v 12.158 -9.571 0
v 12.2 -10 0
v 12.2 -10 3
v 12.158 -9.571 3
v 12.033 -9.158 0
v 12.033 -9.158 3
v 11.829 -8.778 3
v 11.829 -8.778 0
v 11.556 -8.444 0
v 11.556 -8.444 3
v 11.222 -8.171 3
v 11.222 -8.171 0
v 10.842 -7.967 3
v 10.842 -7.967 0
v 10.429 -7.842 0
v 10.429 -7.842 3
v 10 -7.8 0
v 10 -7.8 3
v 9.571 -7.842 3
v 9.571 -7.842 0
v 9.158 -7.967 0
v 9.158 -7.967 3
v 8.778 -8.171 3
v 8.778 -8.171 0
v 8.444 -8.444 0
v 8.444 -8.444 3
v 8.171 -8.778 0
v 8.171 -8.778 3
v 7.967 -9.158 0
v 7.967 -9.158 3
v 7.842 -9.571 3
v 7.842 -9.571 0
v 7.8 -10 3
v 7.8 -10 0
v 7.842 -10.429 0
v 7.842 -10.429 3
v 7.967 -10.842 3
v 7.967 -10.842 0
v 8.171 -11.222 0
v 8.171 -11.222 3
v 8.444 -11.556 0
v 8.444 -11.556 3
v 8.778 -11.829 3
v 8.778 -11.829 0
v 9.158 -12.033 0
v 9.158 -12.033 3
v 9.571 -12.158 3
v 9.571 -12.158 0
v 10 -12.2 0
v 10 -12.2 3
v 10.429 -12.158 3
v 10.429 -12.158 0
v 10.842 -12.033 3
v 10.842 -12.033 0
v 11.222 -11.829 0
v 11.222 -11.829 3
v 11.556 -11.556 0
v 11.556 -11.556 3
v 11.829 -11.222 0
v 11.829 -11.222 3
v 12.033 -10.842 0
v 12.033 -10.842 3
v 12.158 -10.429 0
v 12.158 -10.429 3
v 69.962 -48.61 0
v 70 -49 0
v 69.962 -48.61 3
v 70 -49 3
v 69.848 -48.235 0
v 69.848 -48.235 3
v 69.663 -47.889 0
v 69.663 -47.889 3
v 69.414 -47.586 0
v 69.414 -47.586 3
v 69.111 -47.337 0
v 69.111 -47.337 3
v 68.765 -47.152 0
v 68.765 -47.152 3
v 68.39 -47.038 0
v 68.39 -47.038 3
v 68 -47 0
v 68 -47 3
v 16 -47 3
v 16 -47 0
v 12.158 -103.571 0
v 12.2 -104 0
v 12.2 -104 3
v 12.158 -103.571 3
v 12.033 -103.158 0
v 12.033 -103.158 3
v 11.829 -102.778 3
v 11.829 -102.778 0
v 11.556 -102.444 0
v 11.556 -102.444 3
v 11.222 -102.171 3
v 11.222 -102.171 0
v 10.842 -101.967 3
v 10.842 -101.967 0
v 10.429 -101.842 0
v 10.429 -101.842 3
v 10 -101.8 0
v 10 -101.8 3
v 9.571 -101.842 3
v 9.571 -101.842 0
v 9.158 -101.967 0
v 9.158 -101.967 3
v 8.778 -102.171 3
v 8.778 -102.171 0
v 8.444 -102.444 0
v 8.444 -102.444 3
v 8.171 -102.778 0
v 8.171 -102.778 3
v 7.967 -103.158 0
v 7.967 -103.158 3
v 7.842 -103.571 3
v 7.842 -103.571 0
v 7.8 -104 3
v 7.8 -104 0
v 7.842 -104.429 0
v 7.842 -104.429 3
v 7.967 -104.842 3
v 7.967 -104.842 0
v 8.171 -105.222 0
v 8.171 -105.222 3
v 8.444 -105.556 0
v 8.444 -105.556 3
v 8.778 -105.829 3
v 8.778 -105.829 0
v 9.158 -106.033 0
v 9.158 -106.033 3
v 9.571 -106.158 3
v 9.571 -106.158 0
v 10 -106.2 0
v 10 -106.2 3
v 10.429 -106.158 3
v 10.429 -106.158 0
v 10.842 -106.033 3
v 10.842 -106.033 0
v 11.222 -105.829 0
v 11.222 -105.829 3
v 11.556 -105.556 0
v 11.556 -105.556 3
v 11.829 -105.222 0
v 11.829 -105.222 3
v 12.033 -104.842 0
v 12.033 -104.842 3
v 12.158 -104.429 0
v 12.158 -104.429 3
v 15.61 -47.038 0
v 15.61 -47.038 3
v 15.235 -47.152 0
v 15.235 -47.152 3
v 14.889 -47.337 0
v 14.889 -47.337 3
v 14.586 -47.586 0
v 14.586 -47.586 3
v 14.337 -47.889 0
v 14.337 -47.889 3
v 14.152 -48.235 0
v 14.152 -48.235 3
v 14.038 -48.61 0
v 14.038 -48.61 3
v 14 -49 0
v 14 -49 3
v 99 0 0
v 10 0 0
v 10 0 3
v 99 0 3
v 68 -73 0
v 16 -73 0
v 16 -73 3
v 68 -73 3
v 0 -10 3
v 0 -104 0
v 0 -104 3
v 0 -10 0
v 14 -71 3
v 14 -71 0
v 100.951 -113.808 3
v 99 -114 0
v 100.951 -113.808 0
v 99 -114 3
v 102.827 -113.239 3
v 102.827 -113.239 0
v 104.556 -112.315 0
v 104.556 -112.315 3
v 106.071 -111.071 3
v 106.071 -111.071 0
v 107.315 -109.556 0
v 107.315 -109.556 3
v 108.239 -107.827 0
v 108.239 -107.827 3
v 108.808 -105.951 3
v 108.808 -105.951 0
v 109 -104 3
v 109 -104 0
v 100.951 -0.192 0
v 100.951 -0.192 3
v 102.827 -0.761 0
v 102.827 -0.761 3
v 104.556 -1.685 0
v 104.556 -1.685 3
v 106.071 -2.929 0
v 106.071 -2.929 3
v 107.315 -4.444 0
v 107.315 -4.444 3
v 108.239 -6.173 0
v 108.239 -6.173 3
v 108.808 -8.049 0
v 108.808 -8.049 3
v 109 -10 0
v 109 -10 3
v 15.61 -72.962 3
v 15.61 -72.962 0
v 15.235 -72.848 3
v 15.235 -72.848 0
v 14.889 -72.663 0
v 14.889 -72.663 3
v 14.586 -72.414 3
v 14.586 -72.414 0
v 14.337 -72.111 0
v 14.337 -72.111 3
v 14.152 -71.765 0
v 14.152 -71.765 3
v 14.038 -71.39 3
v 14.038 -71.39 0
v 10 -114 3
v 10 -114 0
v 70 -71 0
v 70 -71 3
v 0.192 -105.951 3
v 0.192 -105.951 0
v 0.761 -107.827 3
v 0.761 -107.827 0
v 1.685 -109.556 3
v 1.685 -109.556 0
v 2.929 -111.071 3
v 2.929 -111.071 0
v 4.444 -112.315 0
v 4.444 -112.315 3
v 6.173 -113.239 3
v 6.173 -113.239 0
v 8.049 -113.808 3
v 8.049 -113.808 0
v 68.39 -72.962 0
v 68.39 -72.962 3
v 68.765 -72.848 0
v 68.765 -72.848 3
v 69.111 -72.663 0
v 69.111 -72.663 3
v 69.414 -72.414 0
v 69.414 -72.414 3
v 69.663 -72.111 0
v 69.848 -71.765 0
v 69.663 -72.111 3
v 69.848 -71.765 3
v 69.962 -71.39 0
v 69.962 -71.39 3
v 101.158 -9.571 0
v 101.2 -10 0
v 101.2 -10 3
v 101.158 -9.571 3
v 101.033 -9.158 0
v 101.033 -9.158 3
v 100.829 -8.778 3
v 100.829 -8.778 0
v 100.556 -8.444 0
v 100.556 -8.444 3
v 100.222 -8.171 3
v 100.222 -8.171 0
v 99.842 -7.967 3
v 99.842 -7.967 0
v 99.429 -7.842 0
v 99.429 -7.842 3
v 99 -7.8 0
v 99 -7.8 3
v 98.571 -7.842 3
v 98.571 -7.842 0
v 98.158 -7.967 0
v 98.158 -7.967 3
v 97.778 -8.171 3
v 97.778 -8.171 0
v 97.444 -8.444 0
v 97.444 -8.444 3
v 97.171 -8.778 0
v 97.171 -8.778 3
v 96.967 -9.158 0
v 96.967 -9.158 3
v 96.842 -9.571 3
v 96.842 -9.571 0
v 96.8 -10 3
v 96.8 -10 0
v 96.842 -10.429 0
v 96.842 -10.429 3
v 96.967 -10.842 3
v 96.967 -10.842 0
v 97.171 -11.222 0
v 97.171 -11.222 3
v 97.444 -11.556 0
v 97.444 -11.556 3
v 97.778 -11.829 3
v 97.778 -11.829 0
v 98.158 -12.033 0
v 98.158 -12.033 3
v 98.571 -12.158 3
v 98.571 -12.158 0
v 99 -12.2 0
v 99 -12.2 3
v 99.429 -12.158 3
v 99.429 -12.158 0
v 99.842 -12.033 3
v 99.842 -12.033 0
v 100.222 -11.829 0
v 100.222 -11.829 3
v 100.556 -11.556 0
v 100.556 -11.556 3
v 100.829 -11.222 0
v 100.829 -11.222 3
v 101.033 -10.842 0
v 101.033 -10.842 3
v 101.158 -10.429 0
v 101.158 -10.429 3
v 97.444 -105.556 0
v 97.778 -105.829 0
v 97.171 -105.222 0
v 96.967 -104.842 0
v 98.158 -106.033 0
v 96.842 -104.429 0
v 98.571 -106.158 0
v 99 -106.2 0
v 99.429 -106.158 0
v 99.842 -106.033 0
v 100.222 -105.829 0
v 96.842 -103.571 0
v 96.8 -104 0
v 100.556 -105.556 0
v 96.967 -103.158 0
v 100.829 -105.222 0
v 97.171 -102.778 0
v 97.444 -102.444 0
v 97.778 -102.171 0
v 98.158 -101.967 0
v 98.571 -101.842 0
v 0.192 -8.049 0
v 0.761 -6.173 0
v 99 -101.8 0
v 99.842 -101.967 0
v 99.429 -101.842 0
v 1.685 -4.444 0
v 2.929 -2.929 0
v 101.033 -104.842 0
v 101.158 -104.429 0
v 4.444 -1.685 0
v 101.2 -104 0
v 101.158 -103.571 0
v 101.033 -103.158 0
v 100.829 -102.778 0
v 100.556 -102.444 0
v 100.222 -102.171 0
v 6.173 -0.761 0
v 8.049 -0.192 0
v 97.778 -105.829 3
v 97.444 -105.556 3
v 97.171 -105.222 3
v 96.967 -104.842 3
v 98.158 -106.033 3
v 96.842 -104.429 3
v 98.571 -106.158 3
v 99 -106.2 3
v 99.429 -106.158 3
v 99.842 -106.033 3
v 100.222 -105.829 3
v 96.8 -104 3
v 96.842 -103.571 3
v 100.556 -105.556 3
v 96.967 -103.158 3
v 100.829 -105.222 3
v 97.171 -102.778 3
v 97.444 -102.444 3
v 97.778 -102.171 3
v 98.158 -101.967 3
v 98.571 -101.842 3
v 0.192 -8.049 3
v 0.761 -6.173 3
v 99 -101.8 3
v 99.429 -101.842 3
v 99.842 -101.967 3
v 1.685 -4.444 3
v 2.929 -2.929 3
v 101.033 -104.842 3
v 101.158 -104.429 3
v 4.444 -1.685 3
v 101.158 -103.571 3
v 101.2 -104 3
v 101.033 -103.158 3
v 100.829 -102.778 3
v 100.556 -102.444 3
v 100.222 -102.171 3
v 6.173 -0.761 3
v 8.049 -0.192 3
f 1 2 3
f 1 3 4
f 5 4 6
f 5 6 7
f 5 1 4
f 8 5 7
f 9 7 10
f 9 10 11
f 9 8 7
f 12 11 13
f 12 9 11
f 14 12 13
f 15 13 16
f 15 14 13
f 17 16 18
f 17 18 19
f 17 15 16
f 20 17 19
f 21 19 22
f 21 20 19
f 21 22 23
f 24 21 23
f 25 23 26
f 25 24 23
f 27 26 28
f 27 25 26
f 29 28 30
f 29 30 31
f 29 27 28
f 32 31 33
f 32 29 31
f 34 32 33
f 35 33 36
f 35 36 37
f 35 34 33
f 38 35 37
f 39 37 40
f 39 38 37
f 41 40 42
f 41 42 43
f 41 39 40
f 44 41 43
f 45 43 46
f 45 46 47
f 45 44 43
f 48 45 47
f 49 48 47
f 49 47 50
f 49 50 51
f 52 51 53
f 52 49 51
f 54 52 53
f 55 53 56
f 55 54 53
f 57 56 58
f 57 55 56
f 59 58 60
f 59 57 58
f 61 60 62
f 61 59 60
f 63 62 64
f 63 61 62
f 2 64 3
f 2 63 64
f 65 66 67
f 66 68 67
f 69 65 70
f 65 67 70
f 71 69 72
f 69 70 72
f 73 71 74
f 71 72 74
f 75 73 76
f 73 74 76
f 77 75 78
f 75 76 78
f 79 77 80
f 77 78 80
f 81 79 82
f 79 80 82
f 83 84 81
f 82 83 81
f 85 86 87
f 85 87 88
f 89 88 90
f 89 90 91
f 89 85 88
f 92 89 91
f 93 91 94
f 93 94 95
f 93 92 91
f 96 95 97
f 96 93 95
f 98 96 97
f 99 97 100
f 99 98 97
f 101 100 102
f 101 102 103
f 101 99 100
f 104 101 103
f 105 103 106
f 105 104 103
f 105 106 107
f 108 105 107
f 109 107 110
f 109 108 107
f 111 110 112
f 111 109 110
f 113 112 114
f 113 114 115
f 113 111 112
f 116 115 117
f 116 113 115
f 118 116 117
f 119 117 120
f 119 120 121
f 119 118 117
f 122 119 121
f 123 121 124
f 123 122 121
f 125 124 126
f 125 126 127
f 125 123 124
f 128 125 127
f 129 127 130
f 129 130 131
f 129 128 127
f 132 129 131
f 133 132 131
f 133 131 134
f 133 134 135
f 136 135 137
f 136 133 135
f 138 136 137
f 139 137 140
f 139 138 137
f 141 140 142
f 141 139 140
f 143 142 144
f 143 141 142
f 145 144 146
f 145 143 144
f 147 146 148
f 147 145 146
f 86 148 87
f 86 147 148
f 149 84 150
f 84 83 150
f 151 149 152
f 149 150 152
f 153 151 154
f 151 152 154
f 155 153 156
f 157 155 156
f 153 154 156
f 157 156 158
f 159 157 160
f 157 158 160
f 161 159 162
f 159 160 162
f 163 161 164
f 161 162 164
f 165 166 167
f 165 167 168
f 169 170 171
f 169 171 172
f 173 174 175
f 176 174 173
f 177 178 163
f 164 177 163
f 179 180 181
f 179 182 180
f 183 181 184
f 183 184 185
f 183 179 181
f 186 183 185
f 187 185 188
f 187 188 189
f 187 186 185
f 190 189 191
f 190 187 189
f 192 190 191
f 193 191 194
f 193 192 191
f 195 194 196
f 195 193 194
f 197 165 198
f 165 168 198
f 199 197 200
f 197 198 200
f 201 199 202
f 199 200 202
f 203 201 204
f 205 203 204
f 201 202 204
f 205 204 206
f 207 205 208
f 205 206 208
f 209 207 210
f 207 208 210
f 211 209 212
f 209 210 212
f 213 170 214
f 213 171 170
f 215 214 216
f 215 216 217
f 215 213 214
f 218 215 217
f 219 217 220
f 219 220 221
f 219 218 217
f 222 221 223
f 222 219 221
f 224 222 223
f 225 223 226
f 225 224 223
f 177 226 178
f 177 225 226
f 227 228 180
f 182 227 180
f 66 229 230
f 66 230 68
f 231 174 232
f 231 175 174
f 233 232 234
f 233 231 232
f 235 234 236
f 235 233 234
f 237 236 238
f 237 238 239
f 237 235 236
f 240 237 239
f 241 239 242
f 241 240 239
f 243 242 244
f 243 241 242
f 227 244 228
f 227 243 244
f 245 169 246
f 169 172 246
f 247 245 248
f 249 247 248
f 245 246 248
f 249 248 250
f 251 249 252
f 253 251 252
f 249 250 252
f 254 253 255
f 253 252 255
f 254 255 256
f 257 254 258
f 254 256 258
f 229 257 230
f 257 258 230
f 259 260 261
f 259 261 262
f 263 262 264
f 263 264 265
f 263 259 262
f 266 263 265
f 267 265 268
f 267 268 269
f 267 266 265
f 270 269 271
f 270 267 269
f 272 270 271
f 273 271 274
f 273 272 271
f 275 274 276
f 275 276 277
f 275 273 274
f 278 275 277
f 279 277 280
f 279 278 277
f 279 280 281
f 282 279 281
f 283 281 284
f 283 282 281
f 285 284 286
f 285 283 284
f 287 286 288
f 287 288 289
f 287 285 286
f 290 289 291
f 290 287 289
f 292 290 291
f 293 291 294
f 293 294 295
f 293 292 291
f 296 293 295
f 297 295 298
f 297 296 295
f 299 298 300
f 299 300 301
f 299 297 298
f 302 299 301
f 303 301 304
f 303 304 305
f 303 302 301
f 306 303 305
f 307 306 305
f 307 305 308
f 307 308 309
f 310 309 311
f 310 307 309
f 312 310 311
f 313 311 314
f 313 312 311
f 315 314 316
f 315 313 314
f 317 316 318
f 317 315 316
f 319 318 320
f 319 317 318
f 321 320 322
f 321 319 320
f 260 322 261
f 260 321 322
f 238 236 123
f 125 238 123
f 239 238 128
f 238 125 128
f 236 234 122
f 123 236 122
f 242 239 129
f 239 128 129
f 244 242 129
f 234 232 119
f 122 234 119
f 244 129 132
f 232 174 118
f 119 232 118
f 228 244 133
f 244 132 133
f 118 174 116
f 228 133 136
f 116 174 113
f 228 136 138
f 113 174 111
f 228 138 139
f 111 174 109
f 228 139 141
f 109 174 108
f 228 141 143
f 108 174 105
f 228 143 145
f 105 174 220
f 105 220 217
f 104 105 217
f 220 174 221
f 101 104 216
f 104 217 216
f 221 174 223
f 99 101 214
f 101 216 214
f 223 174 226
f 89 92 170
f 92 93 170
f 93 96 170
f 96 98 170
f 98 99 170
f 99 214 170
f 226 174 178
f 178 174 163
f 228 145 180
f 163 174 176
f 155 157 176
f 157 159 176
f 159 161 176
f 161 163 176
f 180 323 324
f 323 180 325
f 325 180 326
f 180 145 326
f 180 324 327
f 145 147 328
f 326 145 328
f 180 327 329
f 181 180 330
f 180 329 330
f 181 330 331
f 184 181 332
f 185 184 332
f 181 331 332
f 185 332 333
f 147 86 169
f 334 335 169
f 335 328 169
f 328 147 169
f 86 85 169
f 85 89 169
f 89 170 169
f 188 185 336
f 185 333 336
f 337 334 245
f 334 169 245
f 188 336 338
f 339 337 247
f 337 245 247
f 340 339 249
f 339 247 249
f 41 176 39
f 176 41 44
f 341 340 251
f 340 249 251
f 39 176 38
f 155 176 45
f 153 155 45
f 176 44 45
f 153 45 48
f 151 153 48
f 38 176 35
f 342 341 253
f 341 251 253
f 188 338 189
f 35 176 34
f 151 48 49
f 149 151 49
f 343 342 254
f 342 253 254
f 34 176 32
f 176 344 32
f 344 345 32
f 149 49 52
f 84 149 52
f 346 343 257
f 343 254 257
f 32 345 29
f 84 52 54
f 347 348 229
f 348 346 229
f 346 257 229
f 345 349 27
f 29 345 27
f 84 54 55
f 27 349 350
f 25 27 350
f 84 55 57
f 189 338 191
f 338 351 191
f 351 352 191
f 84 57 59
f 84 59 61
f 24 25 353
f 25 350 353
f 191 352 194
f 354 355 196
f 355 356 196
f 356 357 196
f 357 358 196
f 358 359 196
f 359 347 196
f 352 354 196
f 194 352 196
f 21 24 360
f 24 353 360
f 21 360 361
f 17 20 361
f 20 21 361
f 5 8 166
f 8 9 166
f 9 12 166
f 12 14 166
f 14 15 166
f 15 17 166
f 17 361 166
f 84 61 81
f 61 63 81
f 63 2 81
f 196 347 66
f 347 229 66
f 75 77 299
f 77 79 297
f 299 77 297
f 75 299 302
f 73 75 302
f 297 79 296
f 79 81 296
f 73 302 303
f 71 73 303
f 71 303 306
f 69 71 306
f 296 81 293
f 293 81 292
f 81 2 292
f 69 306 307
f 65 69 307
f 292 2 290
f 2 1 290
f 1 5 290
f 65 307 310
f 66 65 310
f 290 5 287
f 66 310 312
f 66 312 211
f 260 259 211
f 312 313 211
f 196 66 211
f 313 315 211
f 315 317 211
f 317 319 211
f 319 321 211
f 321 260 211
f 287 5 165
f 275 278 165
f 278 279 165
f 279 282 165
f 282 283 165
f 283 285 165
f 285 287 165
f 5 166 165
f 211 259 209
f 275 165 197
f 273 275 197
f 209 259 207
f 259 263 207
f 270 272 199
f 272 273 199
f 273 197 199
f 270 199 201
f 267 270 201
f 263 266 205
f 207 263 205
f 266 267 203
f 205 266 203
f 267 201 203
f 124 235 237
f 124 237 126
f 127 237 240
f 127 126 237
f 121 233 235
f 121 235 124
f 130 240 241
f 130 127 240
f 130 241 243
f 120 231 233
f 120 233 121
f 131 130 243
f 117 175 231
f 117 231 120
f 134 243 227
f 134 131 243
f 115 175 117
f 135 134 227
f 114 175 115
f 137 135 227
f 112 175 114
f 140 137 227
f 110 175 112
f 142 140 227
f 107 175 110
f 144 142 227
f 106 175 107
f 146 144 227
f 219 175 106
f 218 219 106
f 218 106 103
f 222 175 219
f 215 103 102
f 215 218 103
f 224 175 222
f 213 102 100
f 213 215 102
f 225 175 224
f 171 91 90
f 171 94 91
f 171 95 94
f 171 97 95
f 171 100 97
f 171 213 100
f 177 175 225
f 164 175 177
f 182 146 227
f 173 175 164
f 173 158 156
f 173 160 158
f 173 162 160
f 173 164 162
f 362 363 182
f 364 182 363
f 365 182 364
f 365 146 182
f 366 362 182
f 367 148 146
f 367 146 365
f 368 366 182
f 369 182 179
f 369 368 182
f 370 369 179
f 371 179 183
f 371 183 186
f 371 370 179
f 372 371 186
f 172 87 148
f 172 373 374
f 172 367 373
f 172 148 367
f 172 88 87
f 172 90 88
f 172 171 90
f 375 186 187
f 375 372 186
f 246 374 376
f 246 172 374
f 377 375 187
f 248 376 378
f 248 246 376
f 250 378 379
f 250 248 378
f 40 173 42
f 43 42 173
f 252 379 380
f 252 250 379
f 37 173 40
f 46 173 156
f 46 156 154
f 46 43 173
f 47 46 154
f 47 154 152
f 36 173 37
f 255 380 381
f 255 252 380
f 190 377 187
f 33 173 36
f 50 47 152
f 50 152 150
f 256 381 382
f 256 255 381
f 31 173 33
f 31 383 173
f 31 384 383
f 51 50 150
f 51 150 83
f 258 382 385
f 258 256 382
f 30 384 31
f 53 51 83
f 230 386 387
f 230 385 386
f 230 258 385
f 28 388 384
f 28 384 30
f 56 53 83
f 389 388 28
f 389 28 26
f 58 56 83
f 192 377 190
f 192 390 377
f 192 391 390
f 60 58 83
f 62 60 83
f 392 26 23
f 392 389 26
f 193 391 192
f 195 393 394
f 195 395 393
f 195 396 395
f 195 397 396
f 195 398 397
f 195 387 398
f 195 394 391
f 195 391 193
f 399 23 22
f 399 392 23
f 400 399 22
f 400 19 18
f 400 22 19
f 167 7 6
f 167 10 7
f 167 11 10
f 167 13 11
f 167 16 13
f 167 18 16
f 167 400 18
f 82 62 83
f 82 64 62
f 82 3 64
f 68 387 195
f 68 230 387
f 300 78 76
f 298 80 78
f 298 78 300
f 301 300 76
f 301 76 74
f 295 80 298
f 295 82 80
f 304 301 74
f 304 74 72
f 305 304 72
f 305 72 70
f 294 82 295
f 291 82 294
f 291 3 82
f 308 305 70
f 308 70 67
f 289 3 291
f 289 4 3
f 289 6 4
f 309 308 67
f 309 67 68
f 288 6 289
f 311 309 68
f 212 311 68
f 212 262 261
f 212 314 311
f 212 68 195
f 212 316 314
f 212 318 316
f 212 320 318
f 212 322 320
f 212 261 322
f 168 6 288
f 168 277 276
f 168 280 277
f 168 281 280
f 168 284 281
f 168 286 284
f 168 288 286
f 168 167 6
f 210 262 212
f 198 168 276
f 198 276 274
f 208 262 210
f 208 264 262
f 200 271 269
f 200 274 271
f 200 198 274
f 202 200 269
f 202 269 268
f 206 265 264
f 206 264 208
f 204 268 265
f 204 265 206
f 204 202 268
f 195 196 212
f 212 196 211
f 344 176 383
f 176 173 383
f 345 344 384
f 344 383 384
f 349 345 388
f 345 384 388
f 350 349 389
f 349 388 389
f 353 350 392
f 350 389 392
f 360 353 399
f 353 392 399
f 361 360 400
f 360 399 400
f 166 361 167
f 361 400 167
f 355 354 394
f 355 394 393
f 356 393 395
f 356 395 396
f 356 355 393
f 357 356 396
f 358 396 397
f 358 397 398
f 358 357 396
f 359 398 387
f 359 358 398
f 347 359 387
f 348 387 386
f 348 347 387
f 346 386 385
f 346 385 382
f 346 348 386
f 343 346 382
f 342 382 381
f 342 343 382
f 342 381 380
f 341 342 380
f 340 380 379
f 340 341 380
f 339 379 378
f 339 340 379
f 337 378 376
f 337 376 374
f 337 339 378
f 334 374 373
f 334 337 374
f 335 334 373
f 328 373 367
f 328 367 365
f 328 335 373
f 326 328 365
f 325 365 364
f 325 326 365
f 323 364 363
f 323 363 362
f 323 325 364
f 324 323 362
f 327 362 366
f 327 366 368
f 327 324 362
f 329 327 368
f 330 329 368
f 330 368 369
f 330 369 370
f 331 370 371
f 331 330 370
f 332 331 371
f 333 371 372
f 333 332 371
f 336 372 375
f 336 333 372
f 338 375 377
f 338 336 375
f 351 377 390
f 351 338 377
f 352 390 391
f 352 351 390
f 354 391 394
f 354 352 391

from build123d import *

# Parameters (mm, degrees)
SKETCH_1_W      = 109
SKETCH_1_H      = 114
SKETCH_1_R      = 2.2
SKETCH_1_W_2    = 56
SKETCH_1_H_2    = 26
EXTRUDE_1_DEPTH = 3
FILLET_2_R      = 2
FILLET_3_R      = 10


with BuildPart() as part:
    # 草图1 → 凸台-拉伸1 (new body)
    with BuildSketch(Plane.XY):
        with Locations((54.5, -57)):
            Rectangle(SKETCH_1_W, SKETCH_1_H)
        with Locations((99, -10)):
            Circle(SKETCH_1_R, mode=Mode.SUBTRACT)
        with Locations((99, -104)):
            Circle(SKETCH_1_R, mode=Mode.SUBTRACT)
        with Locations((10, -10)):
            Circle(SKETCH_1_R, mode=Mode.SUBTRACT)
        with Locations((10, -104)):
            Circle(SKETCH_1_R, mode=Mode.SUBTRACT)
        with Locations((42, -60)):
            Rectangle(SKETCH_1_W_2, SKETCH_1_H_2, mode=Mode.SUBTRACT)
    extrude(amount=EXTRUDE_1_DEPTH)

    # 圆角2
    fillet_2_edges = [part.edges().sort_by_distance(p)[0] for p in [
        (14, -47, 1.5),
        (14, -73, 1.5),
        (70, -73, 1.5),
        (70, -47, 1.5),
    ]]
    fillet(fillet_2_edges, radius=FILLET_2_R)

    # 圆角3
    fillet_3_edges = [part.edges().sort_by_distance(p)[0] for p in [
        (0, 0, 1.5),
        (109, 0, 1.5),
        (109, -114, 1.5),
        (0, -114, 1.5),
    ]]
    fillet(fillet_3_edges, radius=FILLET_3_R)


solid = part.part
